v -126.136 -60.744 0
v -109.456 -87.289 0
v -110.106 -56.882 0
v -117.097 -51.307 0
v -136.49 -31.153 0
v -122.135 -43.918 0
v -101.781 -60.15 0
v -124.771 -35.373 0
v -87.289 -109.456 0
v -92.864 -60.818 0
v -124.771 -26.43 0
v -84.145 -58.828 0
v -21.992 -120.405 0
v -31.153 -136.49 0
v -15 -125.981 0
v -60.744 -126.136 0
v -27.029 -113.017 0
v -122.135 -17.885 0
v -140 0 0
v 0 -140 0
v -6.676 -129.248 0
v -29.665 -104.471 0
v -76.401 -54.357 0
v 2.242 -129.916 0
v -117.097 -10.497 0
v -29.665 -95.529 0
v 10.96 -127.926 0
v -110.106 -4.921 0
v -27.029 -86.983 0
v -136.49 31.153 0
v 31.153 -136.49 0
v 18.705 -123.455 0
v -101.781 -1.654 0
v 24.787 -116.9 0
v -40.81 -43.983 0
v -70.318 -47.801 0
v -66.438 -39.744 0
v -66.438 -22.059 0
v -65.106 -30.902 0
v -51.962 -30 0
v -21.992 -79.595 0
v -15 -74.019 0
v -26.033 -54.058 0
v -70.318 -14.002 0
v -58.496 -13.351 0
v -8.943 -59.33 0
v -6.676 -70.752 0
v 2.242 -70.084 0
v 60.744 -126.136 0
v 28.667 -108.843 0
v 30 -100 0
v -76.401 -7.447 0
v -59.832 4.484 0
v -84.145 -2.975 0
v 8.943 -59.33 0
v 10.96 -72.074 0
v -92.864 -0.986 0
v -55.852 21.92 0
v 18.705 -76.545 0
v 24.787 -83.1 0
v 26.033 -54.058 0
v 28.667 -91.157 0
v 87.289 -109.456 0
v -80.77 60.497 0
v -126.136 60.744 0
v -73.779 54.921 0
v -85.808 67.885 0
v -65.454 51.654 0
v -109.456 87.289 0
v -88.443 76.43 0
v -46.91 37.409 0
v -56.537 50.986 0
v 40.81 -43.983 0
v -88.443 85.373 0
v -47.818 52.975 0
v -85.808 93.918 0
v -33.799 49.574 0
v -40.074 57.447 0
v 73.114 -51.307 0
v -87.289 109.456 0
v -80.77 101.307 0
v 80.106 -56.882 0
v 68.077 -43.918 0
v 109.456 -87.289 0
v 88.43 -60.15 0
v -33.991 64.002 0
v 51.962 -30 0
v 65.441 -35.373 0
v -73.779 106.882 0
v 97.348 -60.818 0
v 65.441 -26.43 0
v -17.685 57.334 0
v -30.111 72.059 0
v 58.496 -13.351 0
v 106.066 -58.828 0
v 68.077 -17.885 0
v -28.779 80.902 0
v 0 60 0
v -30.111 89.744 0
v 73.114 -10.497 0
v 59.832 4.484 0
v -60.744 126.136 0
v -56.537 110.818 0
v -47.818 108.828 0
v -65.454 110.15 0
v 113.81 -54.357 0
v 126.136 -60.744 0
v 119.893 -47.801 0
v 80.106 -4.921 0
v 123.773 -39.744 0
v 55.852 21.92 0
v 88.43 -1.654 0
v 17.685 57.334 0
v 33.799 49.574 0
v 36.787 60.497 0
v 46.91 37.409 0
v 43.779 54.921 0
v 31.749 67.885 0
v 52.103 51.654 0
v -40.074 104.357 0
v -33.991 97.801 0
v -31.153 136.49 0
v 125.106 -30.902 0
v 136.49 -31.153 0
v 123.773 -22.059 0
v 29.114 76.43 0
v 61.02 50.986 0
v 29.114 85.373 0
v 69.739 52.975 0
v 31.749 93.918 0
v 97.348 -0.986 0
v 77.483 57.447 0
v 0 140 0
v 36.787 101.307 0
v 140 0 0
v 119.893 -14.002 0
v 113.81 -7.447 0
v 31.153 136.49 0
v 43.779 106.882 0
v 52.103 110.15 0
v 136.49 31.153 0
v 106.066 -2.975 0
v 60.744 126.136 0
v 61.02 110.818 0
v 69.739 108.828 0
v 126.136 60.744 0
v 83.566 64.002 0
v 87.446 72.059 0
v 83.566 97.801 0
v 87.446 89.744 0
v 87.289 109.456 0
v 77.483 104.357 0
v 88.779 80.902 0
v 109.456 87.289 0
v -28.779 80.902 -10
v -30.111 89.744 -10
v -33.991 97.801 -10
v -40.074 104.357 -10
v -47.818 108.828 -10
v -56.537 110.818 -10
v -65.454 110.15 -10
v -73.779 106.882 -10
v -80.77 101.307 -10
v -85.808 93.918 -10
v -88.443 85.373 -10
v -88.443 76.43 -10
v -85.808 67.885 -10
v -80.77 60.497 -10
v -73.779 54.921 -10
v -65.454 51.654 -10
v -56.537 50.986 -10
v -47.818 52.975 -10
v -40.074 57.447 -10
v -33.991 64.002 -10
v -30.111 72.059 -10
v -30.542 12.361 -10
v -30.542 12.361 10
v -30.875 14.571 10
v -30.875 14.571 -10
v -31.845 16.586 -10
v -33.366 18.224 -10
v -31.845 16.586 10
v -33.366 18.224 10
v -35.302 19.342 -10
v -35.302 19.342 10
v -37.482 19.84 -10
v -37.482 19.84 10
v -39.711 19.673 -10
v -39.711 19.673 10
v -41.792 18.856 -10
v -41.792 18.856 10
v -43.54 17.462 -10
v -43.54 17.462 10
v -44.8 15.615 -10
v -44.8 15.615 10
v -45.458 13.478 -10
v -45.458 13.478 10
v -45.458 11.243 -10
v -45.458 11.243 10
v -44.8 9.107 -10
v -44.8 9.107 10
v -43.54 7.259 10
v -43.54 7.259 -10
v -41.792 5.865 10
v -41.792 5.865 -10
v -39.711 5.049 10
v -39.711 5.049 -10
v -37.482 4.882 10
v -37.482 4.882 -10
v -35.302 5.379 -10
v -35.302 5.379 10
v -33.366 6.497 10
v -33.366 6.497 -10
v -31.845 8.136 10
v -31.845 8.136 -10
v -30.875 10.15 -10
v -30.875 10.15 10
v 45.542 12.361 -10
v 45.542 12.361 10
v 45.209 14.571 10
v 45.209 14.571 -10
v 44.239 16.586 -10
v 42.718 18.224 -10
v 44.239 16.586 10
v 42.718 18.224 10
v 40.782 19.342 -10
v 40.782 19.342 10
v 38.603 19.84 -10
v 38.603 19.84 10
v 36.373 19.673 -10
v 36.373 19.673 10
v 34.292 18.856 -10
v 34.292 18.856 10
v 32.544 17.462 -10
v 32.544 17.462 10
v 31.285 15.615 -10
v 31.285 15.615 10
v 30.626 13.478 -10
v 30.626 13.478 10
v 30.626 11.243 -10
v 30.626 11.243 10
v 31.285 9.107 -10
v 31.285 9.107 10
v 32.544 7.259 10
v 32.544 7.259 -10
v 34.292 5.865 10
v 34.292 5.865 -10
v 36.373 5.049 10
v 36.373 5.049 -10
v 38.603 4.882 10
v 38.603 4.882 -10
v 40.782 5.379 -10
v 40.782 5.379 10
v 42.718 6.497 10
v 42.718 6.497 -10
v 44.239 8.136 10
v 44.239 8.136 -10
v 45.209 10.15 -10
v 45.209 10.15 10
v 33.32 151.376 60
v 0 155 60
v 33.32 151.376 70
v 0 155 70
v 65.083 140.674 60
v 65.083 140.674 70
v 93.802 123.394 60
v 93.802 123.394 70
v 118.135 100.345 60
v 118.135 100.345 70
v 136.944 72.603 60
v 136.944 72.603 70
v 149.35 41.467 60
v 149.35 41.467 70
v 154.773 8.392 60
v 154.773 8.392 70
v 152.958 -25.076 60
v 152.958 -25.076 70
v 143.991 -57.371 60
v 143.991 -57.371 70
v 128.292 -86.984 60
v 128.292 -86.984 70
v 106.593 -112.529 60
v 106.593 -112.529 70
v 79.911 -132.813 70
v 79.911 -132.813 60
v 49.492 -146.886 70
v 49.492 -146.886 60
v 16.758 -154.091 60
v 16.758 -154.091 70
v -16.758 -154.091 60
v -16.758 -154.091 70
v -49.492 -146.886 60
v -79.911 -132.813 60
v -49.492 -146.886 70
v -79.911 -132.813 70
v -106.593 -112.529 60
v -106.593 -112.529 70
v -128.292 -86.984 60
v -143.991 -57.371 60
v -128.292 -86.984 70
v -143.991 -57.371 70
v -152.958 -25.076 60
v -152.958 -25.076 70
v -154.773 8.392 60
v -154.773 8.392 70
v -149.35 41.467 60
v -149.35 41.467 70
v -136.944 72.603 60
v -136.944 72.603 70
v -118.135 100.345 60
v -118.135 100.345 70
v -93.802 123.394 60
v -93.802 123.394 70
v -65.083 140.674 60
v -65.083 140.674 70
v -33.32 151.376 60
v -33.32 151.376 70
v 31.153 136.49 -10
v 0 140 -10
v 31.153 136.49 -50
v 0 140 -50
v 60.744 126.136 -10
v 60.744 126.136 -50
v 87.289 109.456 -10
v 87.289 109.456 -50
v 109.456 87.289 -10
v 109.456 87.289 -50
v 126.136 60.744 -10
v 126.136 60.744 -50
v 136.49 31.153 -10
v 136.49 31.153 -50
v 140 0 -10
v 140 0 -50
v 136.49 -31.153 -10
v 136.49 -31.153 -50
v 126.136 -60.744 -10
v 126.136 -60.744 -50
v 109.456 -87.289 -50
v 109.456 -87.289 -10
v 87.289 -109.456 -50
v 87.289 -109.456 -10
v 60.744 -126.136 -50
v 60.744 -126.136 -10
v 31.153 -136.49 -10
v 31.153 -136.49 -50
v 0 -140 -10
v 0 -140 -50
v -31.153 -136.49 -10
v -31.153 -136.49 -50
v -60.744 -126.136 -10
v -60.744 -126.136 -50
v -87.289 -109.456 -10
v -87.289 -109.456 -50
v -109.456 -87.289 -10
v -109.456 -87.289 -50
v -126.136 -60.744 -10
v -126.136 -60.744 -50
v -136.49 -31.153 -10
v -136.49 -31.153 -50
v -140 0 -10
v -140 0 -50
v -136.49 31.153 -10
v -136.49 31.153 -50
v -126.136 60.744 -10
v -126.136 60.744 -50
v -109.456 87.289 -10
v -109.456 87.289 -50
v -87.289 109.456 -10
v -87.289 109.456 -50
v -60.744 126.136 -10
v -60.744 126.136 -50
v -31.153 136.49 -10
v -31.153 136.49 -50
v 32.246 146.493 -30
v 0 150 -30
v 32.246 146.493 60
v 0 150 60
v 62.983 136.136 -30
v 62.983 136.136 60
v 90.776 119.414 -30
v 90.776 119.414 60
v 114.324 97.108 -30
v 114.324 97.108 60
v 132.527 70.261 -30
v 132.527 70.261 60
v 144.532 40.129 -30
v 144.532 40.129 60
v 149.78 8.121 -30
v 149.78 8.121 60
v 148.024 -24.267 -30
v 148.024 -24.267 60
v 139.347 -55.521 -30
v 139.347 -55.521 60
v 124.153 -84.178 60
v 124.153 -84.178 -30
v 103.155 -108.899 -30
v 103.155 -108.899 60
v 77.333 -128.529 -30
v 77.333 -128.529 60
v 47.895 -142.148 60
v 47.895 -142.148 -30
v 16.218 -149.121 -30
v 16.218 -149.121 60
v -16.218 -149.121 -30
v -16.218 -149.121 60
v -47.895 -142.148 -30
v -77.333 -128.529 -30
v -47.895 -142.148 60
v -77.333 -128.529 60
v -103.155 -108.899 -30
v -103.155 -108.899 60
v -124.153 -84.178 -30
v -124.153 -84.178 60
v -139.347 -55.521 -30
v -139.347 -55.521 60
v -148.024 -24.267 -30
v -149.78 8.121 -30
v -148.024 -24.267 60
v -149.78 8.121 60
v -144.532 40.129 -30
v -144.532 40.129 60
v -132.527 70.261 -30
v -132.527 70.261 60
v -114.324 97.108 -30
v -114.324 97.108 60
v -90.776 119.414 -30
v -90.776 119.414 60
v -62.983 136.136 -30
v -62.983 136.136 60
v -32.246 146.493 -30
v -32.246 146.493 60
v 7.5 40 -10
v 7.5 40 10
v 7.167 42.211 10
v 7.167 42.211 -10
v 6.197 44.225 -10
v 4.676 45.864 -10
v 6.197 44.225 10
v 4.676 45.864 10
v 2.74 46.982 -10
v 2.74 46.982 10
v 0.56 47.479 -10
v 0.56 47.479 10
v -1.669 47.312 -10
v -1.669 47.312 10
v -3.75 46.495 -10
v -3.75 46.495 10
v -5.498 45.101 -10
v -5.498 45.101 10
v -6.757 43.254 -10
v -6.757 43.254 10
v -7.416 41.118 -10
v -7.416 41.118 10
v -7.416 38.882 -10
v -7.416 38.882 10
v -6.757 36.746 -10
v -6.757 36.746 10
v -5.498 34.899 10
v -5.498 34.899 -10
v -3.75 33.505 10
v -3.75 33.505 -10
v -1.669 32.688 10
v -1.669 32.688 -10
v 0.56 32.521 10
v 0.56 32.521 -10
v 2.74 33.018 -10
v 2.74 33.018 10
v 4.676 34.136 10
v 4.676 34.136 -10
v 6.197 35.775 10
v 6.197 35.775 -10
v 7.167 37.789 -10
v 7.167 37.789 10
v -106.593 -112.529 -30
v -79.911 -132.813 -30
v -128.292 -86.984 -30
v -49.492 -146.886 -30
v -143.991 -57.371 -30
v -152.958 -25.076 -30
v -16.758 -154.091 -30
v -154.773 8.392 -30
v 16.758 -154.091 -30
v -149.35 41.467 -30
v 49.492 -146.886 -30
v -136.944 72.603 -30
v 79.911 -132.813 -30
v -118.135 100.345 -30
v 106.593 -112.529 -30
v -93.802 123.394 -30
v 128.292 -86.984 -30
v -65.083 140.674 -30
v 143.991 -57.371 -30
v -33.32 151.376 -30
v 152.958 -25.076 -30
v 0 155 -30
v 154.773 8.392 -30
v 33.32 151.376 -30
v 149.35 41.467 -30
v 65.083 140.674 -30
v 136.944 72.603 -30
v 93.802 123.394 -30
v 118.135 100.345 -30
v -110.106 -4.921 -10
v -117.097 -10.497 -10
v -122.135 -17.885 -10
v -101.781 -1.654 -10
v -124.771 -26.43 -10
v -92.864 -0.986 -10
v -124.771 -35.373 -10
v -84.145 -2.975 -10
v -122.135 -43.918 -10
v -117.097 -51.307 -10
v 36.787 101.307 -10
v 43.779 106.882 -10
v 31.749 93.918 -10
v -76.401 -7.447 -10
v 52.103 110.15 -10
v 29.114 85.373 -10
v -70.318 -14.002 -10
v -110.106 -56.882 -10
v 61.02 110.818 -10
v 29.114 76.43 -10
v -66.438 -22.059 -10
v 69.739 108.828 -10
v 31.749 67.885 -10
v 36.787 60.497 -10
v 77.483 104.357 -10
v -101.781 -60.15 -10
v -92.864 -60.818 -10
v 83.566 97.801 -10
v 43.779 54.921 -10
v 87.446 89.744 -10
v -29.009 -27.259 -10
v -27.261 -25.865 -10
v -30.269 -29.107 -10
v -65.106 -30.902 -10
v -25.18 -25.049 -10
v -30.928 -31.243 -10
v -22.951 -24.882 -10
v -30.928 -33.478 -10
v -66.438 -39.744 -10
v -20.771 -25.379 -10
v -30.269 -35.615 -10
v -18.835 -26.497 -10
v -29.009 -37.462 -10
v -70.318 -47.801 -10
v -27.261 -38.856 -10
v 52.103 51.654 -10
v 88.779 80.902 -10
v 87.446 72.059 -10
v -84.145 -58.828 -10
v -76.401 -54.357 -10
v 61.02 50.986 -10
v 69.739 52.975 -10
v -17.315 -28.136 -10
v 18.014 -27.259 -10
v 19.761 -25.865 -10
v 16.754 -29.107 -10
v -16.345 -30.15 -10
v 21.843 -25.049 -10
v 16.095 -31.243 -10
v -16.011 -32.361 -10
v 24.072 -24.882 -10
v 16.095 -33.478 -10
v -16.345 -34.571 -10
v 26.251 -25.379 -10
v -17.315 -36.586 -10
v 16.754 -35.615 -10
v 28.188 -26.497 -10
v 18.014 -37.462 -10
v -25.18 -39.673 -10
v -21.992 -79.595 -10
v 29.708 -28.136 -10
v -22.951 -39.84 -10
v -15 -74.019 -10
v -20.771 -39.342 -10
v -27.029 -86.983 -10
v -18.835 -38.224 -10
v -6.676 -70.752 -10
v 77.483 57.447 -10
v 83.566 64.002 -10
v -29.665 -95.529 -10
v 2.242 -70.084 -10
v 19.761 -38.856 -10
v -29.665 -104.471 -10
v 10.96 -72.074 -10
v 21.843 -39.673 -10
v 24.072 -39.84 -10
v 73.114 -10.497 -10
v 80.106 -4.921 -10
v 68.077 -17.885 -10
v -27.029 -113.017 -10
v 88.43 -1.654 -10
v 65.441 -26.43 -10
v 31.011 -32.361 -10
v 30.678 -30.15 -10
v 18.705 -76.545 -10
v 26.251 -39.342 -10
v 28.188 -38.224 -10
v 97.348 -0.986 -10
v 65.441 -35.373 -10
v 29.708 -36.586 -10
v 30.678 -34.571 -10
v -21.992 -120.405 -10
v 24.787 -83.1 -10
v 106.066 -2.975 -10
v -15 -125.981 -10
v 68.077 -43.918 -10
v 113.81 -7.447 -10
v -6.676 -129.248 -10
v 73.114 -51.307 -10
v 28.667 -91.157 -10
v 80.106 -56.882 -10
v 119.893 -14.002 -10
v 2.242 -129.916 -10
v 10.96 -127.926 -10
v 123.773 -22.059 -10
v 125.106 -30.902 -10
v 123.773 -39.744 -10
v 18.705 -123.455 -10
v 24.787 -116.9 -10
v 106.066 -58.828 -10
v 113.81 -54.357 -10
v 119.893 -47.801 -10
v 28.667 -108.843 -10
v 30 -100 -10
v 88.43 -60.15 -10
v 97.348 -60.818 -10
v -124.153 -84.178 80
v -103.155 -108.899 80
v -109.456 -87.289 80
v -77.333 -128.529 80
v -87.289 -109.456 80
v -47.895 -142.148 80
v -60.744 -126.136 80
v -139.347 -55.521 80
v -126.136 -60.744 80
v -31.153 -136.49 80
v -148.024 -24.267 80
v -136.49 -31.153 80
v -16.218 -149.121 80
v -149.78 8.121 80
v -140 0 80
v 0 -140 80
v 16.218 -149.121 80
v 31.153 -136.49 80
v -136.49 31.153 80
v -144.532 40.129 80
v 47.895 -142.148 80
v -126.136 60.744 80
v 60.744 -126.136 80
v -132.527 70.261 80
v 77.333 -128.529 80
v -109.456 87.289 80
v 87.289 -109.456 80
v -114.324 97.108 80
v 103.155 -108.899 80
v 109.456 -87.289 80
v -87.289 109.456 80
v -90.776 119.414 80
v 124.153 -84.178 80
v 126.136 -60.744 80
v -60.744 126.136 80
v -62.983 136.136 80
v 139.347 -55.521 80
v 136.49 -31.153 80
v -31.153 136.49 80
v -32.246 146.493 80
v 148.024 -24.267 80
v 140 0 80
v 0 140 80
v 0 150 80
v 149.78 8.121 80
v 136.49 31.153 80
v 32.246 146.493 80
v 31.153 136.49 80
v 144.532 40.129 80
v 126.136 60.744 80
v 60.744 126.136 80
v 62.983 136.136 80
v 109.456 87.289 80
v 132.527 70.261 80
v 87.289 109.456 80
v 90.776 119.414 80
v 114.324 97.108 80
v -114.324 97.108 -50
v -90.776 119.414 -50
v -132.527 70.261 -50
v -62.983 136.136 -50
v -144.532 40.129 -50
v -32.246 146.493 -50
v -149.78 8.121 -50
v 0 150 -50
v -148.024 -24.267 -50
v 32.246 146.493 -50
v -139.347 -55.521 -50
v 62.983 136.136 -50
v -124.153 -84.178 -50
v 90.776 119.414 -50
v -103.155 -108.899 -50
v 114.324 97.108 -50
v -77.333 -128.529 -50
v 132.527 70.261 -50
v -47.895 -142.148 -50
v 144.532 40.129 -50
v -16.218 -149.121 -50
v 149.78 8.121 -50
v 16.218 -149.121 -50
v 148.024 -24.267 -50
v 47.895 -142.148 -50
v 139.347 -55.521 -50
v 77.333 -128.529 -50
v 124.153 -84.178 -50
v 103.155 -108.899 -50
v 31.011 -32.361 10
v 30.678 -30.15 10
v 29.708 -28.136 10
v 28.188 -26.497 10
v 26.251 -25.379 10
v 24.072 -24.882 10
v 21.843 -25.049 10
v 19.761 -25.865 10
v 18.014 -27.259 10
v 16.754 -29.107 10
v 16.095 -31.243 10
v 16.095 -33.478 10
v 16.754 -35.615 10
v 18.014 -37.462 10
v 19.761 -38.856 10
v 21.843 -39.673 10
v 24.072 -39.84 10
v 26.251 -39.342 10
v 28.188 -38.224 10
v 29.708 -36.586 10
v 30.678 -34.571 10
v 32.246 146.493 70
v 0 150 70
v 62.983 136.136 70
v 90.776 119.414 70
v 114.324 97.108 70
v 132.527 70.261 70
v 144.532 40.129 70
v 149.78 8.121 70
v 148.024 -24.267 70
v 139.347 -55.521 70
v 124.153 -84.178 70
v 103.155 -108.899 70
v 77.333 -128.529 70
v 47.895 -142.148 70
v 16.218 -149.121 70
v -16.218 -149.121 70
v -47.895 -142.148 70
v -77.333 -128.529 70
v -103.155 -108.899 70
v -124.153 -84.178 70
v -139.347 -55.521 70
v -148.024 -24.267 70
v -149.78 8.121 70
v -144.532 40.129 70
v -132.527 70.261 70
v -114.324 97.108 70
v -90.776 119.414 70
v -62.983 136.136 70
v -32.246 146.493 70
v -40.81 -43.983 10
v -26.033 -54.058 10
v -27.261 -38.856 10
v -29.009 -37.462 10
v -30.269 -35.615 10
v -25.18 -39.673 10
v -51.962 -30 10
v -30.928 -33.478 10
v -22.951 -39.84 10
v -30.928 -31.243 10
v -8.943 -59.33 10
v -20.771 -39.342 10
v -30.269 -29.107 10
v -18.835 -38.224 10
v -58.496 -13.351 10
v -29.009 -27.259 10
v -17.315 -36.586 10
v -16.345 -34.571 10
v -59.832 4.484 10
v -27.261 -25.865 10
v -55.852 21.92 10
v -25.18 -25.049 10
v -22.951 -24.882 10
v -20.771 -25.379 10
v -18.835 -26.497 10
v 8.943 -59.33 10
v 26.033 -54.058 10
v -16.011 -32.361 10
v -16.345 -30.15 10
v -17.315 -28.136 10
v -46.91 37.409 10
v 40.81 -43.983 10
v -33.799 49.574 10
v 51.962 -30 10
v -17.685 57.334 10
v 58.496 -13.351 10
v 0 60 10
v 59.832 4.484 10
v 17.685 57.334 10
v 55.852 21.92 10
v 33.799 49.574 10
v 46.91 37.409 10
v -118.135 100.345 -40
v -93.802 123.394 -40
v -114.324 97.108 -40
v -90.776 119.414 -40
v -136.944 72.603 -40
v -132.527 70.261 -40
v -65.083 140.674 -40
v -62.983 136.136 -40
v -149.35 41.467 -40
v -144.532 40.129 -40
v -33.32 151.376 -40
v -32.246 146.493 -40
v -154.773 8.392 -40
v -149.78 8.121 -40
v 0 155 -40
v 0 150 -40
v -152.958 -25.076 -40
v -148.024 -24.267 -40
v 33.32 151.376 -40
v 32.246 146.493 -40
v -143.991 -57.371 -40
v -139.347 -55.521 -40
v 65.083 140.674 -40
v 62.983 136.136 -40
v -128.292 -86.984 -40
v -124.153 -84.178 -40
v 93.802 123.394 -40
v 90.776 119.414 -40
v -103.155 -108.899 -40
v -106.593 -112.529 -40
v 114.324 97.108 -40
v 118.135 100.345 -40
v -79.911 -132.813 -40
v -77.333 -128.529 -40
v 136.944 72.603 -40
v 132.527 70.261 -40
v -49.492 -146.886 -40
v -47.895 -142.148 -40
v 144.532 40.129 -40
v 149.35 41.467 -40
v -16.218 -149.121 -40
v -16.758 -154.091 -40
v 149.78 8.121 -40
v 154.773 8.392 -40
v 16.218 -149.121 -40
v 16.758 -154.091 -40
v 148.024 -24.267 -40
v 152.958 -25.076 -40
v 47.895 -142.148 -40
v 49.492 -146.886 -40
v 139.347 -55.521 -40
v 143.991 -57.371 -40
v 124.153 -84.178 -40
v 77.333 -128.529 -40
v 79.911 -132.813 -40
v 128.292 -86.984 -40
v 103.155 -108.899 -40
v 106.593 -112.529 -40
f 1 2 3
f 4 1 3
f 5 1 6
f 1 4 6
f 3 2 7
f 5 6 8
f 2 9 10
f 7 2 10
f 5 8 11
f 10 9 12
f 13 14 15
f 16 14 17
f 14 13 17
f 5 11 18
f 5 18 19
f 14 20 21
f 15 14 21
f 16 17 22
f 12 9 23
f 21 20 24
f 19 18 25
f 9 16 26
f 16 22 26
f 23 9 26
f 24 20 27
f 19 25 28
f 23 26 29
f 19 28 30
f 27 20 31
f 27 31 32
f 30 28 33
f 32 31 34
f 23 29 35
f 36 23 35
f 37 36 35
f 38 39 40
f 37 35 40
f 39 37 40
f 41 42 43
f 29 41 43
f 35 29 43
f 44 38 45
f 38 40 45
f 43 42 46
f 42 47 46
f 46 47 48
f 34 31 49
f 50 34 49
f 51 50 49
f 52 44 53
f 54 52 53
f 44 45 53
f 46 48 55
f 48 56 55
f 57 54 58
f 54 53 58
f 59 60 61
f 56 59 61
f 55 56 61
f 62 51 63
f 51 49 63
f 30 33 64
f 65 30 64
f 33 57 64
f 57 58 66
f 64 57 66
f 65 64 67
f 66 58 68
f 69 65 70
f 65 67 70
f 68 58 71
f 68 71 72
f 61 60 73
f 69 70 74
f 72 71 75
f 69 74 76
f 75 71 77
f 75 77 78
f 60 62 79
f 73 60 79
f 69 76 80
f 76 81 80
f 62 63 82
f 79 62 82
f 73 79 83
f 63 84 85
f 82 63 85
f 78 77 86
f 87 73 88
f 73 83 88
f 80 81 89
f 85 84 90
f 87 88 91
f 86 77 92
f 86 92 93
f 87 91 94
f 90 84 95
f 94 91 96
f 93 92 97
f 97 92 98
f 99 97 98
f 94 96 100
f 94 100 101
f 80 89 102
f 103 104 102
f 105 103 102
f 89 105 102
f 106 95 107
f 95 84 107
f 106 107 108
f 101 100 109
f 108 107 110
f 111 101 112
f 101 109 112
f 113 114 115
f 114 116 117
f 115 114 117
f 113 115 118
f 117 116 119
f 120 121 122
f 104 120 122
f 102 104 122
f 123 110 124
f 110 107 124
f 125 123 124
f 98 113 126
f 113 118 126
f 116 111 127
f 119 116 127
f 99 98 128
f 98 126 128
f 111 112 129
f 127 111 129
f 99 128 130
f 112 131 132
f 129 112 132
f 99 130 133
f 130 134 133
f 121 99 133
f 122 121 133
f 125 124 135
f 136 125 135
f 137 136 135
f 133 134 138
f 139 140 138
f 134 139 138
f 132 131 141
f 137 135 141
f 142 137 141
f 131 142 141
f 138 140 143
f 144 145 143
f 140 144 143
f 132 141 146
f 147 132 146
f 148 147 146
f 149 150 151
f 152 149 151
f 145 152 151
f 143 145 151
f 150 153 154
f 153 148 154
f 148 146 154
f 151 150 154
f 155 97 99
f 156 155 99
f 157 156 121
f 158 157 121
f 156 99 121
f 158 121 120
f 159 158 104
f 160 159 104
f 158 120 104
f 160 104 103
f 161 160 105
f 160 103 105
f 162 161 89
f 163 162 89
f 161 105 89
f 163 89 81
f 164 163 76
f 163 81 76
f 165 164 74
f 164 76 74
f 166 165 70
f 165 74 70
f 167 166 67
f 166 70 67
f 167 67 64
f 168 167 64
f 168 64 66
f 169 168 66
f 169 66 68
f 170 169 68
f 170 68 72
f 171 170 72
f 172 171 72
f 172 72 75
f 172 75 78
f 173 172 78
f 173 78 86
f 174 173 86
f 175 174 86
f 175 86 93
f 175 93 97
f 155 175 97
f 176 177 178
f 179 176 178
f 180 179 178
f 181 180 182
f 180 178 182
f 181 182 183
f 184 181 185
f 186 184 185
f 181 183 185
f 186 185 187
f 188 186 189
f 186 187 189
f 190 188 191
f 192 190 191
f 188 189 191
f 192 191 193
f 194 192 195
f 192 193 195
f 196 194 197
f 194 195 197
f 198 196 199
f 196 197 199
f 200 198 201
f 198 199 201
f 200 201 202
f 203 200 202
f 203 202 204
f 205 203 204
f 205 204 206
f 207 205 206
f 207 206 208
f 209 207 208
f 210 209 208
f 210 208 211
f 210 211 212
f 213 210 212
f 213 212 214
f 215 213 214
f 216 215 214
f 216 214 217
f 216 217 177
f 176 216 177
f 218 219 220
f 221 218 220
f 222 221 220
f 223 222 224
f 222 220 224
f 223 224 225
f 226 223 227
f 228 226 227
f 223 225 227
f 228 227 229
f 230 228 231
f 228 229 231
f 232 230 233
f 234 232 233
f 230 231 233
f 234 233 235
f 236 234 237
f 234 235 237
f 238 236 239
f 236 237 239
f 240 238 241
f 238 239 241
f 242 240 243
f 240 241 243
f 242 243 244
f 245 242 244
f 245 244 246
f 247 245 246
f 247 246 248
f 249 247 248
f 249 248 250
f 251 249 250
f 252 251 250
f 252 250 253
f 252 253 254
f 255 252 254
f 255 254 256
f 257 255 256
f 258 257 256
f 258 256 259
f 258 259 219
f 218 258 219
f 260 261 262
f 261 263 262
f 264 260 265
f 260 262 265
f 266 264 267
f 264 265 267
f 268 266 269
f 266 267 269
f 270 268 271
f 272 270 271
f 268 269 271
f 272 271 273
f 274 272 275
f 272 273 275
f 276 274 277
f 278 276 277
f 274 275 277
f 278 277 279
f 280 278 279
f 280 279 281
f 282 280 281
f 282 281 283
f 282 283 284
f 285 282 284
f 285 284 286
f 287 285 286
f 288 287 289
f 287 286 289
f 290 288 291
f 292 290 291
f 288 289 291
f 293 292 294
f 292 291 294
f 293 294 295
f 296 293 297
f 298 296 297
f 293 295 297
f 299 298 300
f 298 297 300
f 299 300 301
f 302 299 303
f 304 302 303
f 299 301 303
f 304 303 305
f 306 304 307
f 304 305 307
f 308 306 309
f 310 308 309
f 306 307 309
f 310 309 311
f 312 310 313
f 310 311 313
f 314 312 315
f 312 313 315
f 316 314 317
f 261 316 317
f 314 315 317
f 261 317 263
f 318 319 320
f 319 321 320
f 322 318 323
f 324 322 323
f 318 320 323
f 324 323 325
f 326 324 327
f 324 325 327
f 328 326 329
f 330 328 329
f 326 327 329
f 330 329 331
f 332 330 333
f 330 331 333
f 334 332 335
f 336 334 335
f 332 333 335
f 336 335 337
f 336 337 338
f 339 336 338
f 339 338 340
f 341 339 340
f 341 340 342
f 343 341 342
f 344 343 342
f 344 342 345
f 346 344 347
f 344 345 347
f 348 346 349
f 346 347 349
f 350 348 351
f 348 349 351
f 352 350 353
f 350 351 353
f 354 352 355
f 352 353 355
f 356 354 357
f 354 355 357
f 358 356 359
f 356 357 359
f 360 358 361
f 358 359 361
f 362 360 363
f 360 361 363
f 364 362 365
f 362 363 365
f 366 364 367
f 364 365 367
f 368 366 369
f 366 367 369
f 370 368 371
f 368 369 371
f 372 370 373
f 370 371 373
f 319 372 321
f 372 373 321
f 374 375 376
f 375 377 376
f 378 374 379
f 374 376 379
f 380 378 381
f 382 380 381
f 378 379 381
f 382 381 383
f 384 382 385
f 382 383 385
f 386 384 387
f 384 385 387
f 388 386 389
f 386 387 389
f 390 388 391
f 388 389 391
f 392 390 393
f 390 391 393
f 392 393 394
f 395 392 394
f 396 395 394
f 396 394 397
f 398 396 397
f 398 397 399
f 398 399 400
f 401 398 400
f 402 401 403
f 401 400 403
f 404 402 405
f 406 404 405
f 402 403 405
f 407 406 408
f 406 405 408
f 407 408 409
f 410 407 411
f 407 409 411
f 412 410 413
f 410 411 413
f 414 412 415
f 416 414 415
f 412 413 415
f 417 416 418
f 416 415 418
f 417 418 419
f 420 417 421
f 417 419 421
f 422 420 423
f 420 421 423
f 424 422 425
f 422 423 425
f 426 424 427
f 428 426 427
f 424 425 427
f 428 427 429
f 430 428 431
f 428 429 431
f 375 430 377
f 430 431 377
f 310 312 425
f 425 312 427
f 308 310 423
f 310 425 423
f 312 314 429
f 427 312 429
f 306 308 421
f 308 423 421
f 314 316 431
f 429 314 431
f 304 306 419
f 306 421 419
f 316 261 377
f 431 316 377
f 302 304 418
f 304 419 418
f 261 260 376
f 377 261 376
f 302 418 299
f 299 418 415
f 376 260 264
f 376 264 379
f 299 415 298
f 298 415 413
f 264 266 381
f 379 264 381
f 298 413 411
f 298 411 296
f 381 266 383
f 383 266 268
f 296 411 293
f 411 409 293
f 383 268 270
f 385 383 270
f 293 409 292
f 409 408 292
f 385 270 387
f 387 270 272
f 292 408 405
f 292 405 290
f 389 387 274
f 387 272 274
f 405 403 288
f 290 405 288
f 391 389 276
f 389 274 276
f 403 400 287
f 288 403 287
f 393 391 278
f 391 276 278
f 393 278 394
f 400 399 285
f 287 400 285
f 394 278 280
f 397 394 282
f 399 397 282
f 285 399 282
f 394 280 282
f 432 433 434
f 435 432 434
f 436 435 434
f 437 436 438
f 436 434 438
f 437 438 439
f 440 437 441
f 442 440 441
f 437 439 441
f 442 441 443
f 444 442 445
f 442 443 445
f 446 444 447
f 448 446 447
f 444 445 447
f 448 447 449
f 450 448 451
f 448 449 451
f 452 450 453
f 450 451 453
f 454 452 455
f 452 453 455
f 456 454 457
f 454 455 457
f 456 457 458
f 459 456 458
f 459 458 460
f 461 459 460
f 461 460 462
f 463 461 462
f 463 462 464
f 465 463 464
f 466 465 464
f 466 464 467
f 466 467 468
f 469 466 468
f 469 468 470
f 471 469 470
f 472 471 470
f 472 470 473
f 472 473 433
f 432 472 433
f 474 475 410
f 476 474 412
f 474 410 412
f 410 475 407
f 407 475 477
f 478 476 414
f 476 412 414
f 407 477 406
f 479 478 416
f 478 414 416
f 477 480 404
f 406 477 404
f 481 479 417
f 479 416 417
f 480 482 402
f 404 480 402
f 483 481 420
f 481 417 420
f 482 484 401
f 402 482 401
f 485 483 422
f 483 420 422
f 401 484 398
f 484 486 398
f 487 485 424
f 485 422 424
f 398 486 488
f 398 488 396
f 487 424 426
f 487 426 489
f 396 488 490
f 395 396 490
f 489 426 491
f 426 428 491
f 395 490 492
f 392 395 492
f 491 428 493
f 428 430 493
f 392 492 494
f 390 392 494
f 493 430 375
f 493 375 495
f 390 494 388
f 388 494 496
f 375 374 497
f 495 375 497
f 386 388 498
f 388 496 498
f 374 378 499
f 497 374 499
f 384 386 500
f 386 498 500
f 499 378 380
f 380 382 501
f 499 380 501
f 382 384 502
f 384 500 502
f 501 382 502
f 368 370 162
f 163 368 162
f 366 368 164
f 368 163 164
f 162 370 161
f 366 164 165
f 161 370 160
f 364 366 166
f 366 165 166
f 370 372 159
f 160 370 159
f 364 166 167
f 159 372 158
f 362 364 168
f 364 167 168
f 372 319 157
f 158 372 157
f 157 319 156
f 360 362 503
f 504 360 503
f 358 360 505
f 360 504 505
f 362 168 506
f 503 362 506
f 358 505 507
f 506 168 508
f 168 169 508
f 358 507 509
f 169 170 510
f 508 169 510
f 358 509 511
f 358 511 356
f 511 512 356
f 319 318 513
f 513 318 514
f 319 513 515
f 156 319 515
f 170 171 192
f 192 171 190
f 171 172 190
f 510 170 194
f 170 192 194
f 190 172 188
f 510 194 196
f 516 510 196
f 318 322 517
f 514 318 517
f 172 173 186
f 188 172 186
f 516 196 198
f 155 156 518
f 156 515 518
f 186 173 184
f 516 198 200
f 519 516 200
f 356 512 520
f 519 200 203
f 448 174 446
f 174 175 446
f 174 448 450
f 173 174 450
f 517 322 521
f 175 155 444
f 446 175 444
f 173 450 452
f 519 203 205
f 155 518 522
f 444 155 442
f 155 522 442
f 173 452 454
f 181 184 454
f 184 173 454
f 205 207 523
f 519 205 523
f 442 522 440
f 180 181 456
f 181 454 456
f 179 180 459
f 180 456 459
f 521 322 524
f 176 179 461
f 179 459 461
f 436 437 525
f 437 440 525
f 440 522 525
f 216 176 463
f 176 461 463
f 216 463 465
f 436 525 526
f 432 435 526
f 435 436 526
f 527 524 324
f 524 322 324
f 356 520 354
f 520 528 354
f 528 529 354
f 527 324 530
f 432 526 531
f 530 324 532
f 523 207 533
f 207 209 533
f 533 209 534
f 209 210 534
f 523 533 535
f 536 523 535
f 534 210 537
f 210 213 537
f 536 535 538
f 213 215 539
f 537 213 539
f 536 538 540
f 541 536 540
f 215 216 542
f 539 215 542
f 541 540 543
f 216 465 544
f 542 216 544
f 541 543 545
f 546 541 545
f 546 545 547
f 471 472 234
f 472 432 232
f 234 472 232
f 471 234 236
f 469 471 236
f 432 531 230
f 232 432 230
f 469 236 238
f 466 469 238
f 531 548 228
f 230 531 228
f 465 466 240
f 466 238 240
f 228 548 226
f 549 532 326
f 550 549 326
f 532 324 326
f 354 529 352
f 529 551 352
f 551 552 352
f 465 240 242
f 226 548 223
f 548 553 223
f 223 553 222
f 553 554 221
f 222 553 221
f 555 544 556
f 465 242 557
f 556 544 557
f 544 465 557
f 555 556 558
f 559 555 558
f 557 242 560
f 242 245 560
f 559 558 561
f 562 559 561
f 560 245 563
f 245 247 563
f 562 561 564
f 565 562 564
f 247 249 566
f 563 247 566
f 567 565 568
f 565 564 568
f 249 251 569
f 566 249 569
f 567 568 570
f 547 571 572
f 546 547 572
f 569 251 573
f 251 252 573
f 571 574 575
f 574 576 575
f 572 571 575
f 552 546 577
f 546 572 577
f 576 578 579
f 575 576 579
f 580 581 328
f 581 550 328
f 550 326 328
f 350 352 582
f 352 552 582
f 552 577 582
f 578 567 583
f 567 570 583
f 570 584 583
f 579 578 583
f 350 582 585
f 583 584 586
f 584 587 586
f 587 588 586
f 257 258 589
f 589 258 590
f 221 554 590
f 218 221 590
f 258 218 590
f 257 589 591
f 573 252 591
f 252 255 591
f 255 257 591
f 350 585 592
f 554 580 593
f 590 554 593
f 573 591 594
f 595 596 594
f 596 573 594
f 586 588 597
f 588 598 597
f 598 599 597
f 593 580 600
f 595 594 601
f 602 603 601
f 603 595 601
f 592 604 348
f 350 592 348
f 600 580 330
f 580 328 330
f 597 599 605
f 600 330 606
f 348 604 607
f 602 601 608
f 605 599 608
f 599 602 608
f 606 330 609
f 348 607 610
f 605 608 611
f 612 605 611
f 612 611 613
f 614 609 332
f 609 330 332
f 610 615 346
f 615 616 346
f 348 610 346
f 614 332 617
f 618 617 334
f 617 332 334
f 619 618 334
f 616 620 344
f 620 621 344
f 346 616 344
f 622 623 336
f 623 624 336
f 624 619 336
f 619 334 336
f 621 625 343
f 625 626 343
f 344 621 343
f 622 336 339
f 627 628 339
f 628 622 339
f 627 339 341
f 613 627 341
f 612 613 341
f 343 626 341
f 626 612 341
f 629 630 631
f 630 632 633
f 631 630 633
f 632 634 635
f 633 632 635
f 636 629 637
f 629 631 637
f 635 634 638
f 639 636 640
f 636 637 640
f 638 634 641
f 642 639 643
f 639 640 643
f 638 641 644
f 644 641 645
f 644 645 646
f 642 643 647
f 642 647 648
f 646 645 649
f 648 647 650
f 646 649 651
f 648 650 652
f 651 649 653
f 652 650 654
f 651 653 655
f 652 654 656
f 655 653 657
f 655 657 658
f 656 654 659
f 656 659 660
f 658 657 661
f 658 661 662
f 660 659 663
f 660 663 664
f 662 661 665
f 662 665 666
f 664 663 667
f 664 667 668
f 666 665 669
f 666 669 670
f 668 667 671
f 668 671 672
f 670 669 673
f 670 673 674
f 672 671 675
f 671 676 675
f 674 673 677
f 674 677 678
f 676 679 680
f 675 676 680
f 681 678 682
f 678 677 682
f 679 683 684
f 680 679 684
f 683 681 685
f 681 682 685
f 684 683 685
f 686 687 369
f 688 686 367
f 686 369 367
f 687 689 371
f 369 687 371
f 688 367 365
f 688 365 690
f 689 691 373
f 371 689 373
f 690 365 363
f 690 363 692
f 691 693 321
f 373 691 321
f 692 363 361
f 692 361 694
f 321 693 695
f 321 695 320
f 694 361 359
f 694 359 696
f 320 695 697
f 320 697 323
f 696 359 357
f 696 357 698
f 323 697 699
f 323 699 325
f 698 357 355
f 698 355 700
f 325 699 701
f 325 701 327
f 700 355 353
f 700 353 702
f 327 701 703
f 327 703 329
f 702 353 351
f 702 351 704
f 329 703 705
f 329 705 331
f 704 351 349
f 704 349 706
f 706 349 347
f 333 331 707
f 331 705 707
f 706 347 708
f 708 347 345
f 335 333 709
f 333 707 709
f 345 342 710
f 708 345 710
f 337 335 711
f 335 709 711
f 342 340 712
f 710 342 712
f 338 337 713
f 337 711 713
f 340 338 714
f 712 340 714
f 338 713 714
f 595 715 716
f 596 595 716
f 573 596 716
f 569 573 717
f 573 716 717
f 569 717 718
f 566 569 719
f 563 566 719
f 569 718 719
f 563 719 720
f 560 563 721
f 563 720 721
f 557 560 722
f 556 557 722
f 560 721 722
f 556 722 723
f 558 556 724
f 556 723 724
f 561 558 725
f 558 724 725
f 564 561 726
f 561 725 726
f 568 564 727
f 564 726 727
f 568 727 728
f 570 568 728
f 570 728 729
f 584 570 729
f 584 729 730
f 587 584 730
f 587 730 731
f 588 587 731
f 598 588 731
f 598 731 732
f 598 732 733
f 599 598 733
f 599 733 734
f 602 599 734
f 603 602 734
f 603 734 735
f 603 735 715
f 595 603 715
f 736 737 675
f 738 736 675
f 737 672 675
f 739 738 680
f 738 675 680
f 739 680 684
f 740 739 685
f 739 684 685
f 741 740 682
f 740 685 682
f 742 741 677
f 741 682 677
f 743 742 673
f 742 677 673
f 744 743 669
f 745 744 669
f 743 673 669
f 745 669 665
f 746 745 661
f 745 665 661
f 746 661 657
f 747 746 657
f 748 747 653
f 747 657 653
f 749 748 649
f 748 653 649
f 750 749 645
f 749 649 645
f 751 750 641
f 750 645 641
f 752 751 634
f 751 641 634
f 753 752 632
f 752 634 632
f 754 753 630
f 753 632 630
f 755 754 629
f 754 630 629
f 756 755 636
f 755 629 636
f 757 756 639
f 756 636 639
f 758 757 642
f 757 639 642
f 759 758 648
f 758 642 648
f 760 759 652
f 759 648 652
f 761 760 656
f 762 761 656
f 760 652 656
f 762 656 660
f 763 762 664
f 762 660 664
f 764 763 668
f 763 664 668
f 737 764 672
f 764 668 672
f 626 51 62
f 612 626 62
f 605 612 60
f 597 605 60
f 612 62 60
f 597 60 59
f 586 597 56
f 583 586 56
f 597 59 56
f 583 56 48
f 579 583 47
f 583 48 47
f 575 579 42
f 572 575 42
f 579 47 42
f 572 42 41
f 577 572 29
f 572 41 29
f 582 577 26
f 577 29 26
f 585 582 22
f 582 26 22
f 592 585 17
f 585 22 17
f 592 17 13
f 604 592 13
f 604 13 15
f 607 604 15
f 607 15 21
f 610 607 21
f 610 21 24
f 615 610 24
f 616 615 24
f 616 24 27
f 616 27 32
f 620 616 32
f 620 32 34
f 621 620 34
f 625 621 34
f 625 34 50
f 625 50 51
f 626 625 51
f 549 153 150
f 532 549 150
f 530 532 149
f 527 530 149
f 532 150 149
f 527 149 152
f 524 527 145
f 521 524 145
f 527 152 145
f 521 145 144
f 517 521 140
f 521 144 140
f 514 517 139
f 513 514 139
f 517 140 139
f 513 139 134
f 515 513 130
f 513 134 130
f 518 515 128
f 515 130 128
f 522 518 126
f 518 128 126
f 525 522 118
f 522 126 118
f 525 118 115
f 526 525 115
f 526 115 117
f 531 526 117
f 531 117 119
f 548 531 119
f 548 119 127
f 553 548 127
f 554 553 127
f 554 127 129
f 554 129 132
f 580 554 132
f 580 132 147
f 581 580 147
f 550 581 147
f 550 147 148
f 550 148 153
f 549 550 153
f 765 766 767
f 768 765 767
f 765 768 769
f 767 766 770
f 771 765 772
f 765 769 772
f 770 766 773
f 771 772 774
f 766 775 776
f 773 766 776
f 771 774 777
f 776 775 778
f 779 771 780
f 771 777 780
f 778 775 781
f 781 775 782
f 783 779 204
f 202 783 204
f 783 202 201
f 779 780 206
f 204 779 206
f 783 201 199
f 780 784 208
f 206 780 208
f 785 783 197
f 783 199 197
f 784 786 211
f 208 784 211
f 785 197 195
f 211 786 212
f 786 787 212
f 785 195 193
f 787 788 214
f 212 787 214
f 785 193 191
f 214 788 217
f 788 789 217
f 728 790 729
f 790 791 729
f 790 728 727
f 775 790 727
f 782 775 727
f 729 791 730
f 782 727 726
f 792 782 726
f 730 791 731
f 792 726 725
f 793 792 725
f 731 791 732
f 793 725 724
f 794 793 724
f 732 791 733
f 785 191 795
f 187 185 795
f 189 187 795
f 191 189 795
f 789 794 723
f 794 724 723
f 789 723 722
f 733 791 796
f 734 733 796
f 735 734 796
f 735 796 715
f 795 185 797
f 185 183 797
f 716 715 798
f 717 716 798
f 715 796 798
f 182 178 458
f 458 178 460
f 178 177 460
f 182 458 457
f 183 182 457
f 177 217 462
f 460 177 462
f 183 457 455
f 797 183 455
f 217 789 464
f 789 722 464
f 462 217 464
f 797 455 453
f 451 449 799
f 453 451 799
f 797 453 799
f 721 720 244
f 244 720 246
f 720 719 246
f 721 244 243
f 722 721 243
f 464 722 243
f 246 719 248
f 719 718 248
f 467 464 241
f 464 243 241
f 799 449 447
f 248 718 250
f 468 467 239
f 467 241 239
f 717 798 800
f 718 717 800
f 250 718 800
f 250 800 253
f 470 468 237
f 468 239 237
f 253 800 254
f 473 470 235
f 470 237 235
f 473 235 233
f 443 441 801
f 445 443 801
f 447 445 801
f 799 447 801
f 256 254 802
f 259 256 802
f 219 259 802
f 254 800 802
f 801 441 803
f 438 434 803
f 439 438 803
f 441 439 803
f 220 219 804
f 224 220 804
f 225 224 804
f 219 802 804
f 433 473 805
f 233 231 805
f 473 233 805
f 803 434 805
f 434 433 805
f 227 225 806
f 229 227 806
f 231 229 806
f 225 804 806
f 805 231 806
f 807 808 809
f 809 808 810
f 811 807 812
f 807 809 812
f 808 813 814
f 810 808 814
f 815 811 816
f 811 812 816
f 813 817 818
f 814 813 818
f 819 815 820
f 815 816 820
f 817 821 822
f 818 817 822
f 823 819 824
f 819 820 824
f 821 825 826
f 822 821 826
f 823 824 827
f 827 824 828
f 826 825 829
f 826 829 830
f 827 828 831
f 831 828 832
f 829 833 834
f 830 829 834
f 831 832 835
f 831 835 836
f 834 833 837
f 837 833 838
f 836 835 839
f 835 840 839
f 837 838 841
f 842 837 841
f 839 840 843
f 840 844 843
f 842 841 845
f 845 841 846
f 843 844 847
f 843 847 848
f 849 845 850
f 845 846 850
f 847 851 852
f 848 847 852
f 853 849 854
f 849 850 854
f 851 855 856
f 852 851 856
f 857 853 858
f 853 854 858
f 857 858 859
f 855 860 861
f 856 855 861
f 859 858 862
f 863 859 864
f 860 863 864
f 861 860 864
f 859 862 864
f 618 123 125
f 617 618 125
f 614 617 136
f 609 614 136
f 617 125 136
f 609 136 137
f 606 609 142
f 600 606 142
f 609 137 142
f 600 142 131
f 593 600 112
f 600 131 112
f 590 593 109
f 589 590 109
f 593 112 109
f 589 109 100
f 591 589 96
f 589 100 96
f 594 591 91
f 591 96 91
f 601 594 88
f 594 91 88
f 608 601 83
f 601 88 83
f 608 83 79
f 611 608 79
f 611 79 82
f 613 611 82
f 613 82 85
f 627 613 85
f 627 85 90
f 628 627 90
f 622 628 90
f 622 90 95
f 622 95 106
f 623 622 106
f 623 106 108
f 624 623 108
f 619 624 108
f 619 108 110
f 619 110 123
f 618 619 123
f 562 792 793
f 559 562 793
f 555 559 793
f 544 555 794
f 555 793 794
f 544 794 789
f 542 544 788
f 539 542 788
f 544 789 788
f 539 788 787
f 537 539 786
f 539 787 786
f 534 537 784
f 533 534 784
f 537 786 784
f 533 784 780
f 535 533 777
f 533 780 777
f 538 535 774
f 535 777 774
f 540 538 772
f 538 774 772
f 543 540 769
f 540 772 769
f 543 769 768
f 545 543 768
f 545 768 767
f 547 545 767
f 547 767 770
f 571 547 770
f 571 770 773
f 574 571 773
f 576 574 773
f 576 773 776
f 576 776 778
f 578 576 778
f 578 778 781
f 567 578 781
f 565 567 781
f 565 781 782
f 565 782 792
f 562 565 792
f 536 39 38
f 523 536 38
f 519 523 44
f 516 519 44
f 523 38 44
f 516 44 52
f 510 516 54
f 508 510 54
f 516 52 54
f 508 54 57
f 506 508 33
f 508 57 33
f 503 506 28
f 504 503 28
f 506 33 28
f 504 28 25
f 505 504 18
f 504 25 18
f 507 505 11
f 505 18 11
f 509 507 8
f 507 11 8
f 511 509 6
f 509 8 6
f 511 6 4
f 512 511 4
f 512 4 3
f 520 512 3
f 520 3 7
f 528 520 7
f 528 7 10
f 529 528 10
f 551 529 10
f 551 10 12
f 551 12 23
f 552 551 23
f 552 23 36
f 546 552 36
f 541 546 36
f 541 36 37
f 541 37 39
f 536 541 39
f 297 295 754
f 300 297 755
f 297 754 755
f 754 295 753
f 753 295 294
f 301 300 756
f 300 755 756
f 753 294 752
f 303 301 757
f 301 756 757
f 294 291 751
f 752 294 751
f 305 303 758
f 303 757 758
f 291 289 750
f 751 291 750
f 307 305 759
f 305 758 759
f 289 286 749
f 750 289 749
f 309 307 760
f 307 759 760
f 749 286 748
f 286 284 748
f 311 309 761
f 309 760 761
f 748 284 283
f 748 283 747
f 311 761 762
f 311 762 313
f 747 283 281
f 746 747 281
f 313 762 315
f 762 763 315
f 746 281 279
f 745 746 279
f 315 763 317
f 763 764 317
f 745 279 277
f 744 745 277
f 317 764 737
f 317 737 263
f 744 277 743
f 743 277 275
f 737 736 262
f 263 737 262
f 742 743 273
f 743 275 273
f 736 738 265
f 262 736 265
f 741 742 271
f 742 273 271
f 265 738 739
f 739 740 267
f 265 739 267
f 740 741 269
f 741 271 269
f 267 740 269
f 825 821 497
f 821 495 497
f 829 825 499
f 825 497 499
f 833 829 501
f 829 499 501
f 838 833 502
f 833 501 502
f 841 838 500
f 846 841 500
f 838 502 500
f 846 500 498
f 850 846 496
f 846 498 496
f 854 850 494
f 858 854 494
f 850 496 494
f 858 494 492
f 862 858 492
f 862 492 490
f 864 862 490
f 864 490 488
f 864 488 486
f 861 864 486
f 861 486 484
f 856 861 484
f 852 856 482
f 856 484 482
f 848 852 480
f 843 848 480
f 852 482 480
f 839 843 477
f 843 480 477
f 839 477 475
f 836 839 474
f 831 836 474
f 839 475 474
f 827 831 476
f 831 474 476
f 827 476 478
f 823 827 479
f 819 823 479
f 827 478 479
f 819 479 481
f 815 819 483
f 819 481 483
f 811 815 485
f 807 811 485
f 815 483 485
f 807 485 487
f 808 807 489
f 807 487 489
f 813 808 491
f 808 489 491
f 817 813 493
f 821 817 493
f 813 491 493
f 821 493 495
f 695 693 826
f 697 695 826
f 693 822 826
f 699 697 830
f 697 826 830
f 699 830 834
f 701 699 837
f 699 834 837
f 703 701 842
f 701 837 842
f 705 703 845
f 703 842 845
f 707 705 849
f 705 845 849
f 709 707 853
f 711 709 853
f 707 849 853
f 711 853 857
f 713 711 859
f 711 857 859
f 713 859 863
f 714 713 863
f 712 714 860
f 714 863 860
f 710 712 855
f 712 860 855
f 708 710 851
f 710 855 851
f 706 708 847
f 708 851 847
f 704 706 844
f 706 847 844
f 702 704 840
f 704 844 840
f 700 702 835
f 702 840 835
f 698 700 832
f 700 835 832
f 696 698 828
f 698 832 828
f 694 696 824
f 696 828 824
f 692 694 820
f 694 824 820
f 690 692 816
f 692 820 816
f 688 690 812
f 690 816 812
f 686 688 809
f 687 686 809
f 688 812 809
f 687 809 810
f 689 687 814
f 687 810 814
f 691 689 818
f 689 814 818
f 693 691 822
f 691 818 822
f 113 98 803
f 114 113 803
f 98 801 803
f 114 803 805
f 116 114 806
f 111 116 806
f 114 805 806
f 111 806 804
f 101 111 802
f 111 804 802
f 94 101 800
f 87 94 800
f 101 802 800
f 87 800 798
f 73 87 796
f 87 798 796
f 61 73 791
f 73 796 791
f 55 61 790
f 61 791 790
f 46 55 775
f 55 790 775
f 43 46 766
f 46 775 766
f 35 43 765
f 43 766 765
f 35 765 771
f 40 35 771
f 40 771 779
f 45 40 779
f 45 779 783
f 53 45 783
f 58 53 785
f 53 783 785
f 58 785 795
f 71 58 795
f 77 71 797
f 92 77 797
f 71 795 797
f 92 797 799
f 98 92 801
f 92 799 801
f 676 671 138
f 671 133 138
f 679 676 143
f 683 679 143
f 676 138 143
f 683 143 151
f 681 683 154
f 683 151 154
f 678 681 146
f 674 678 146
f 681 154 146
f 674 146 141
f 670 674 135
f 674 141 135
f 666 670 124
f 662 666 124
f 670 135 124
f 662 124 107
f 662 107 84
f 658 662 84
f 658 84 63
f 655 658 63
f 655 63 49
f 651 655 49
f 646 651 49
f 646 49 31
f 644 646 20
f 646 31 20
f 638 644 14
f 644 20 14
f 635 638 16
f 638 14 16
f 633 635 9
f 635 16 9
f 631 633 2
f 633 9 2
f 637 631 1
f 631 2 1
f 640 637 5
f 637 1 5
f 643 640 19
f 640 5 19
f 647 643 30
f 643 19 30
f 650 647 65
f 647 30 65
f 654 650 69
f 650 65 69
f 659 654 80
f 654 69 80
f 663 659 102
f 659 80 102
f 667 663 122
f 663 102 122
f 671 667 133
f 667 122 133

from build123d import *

# Parameters (mm, degrees)
SKETCH8_R               = 7.5
CUT_EXTRUDE1_DEPTH      = 71
CUT_EXTRUDE1_DEPTH_BACK = 61
SKETCH9_R               = 30
CUT_EXTRUDE2_DEPTH      = 81
CUT_EXTRUDE2_DEPTH_BACK = 51


with BuildPart() as part:
    # Sketch6 → Revolve3 (revolve)
    with BuildSketch(Plane(origin=(0, 0, 0), x_dir=(0, 0, -1), z_dir=(1, 0, 0))):
        Polygon((0, 0), (10, 0), (10, 140), (50, 140), (50, 150), (40, 150), (40, 155), (30, 155), (30, 150), (-60, 150), (-60, 155), (-70, 155), (-70, 150), (-80, 150), (-80, 140), (0, 140), (0, 60), (-10, 60), (-10, 0), align=None)
    revolve(axis=Axis((0, 0, 10), (0, 0, -1)))

    # Sketch8 → Cut-Extrude1 (cut, two sides)
    with BuildSketch(Plane.XY.offset(10)) as cut_extrude1_sk:
        with Locations((0, 40)):
            Circle(SKETCH8_R)
        with Locations((38.042260652, 12.360679775)):
            Circle(SKETCH8_R)
        with Locations((23.511410092, -32.360679775)):
            Circle(SKETCH8_R)
        with Locations((-23.511410092, -32.360679775)):
            Circle(SKETCH8_R)
        with Locations((-38.042260652, 12.360679775)):
            Circle(SKETCH8_R)
    extrude(amount=CUT_EXTRUDE1_DEPTH, mode=Mode.SUBTRACT)
    extrude(cut_extrude1_sk.sketch, amount=-CUT_EXTRUDE1_DEPTH_BACK, mode=Mode.SUBTRACT)

    # Sketch9 → Cut-Extrude2 (cut, two sides)
    with BuildSketch(Plane.XY) as cut_extrude2_sk:
        with Locations((0, -100)):
            Circle(SKETCH9_R)
        with Locations((-95.10565163, -30.901699437)):
            Circle(SKETCH9_R)
        with Locations((-58.778525229, 80.901699437)):
            Circle(SKETCH9_R)
        with Locations((58.778525229, 80.901699437)):
            Circle(SKETCH9_R)
        with Locations((95.10565163, -30.901699437)):
            Circle(SKETCH9_R)
    extrude(amount=CUT_EXTRUDE2_DEPTH, mode=Mode.SUBTRACT)
    extrude(cut_extrude2_sk.sketch, amount=-CUT_EXTRUDE2_DEPTH_BACK, mode=Mode.SUBTRACT)


solid = part.part
